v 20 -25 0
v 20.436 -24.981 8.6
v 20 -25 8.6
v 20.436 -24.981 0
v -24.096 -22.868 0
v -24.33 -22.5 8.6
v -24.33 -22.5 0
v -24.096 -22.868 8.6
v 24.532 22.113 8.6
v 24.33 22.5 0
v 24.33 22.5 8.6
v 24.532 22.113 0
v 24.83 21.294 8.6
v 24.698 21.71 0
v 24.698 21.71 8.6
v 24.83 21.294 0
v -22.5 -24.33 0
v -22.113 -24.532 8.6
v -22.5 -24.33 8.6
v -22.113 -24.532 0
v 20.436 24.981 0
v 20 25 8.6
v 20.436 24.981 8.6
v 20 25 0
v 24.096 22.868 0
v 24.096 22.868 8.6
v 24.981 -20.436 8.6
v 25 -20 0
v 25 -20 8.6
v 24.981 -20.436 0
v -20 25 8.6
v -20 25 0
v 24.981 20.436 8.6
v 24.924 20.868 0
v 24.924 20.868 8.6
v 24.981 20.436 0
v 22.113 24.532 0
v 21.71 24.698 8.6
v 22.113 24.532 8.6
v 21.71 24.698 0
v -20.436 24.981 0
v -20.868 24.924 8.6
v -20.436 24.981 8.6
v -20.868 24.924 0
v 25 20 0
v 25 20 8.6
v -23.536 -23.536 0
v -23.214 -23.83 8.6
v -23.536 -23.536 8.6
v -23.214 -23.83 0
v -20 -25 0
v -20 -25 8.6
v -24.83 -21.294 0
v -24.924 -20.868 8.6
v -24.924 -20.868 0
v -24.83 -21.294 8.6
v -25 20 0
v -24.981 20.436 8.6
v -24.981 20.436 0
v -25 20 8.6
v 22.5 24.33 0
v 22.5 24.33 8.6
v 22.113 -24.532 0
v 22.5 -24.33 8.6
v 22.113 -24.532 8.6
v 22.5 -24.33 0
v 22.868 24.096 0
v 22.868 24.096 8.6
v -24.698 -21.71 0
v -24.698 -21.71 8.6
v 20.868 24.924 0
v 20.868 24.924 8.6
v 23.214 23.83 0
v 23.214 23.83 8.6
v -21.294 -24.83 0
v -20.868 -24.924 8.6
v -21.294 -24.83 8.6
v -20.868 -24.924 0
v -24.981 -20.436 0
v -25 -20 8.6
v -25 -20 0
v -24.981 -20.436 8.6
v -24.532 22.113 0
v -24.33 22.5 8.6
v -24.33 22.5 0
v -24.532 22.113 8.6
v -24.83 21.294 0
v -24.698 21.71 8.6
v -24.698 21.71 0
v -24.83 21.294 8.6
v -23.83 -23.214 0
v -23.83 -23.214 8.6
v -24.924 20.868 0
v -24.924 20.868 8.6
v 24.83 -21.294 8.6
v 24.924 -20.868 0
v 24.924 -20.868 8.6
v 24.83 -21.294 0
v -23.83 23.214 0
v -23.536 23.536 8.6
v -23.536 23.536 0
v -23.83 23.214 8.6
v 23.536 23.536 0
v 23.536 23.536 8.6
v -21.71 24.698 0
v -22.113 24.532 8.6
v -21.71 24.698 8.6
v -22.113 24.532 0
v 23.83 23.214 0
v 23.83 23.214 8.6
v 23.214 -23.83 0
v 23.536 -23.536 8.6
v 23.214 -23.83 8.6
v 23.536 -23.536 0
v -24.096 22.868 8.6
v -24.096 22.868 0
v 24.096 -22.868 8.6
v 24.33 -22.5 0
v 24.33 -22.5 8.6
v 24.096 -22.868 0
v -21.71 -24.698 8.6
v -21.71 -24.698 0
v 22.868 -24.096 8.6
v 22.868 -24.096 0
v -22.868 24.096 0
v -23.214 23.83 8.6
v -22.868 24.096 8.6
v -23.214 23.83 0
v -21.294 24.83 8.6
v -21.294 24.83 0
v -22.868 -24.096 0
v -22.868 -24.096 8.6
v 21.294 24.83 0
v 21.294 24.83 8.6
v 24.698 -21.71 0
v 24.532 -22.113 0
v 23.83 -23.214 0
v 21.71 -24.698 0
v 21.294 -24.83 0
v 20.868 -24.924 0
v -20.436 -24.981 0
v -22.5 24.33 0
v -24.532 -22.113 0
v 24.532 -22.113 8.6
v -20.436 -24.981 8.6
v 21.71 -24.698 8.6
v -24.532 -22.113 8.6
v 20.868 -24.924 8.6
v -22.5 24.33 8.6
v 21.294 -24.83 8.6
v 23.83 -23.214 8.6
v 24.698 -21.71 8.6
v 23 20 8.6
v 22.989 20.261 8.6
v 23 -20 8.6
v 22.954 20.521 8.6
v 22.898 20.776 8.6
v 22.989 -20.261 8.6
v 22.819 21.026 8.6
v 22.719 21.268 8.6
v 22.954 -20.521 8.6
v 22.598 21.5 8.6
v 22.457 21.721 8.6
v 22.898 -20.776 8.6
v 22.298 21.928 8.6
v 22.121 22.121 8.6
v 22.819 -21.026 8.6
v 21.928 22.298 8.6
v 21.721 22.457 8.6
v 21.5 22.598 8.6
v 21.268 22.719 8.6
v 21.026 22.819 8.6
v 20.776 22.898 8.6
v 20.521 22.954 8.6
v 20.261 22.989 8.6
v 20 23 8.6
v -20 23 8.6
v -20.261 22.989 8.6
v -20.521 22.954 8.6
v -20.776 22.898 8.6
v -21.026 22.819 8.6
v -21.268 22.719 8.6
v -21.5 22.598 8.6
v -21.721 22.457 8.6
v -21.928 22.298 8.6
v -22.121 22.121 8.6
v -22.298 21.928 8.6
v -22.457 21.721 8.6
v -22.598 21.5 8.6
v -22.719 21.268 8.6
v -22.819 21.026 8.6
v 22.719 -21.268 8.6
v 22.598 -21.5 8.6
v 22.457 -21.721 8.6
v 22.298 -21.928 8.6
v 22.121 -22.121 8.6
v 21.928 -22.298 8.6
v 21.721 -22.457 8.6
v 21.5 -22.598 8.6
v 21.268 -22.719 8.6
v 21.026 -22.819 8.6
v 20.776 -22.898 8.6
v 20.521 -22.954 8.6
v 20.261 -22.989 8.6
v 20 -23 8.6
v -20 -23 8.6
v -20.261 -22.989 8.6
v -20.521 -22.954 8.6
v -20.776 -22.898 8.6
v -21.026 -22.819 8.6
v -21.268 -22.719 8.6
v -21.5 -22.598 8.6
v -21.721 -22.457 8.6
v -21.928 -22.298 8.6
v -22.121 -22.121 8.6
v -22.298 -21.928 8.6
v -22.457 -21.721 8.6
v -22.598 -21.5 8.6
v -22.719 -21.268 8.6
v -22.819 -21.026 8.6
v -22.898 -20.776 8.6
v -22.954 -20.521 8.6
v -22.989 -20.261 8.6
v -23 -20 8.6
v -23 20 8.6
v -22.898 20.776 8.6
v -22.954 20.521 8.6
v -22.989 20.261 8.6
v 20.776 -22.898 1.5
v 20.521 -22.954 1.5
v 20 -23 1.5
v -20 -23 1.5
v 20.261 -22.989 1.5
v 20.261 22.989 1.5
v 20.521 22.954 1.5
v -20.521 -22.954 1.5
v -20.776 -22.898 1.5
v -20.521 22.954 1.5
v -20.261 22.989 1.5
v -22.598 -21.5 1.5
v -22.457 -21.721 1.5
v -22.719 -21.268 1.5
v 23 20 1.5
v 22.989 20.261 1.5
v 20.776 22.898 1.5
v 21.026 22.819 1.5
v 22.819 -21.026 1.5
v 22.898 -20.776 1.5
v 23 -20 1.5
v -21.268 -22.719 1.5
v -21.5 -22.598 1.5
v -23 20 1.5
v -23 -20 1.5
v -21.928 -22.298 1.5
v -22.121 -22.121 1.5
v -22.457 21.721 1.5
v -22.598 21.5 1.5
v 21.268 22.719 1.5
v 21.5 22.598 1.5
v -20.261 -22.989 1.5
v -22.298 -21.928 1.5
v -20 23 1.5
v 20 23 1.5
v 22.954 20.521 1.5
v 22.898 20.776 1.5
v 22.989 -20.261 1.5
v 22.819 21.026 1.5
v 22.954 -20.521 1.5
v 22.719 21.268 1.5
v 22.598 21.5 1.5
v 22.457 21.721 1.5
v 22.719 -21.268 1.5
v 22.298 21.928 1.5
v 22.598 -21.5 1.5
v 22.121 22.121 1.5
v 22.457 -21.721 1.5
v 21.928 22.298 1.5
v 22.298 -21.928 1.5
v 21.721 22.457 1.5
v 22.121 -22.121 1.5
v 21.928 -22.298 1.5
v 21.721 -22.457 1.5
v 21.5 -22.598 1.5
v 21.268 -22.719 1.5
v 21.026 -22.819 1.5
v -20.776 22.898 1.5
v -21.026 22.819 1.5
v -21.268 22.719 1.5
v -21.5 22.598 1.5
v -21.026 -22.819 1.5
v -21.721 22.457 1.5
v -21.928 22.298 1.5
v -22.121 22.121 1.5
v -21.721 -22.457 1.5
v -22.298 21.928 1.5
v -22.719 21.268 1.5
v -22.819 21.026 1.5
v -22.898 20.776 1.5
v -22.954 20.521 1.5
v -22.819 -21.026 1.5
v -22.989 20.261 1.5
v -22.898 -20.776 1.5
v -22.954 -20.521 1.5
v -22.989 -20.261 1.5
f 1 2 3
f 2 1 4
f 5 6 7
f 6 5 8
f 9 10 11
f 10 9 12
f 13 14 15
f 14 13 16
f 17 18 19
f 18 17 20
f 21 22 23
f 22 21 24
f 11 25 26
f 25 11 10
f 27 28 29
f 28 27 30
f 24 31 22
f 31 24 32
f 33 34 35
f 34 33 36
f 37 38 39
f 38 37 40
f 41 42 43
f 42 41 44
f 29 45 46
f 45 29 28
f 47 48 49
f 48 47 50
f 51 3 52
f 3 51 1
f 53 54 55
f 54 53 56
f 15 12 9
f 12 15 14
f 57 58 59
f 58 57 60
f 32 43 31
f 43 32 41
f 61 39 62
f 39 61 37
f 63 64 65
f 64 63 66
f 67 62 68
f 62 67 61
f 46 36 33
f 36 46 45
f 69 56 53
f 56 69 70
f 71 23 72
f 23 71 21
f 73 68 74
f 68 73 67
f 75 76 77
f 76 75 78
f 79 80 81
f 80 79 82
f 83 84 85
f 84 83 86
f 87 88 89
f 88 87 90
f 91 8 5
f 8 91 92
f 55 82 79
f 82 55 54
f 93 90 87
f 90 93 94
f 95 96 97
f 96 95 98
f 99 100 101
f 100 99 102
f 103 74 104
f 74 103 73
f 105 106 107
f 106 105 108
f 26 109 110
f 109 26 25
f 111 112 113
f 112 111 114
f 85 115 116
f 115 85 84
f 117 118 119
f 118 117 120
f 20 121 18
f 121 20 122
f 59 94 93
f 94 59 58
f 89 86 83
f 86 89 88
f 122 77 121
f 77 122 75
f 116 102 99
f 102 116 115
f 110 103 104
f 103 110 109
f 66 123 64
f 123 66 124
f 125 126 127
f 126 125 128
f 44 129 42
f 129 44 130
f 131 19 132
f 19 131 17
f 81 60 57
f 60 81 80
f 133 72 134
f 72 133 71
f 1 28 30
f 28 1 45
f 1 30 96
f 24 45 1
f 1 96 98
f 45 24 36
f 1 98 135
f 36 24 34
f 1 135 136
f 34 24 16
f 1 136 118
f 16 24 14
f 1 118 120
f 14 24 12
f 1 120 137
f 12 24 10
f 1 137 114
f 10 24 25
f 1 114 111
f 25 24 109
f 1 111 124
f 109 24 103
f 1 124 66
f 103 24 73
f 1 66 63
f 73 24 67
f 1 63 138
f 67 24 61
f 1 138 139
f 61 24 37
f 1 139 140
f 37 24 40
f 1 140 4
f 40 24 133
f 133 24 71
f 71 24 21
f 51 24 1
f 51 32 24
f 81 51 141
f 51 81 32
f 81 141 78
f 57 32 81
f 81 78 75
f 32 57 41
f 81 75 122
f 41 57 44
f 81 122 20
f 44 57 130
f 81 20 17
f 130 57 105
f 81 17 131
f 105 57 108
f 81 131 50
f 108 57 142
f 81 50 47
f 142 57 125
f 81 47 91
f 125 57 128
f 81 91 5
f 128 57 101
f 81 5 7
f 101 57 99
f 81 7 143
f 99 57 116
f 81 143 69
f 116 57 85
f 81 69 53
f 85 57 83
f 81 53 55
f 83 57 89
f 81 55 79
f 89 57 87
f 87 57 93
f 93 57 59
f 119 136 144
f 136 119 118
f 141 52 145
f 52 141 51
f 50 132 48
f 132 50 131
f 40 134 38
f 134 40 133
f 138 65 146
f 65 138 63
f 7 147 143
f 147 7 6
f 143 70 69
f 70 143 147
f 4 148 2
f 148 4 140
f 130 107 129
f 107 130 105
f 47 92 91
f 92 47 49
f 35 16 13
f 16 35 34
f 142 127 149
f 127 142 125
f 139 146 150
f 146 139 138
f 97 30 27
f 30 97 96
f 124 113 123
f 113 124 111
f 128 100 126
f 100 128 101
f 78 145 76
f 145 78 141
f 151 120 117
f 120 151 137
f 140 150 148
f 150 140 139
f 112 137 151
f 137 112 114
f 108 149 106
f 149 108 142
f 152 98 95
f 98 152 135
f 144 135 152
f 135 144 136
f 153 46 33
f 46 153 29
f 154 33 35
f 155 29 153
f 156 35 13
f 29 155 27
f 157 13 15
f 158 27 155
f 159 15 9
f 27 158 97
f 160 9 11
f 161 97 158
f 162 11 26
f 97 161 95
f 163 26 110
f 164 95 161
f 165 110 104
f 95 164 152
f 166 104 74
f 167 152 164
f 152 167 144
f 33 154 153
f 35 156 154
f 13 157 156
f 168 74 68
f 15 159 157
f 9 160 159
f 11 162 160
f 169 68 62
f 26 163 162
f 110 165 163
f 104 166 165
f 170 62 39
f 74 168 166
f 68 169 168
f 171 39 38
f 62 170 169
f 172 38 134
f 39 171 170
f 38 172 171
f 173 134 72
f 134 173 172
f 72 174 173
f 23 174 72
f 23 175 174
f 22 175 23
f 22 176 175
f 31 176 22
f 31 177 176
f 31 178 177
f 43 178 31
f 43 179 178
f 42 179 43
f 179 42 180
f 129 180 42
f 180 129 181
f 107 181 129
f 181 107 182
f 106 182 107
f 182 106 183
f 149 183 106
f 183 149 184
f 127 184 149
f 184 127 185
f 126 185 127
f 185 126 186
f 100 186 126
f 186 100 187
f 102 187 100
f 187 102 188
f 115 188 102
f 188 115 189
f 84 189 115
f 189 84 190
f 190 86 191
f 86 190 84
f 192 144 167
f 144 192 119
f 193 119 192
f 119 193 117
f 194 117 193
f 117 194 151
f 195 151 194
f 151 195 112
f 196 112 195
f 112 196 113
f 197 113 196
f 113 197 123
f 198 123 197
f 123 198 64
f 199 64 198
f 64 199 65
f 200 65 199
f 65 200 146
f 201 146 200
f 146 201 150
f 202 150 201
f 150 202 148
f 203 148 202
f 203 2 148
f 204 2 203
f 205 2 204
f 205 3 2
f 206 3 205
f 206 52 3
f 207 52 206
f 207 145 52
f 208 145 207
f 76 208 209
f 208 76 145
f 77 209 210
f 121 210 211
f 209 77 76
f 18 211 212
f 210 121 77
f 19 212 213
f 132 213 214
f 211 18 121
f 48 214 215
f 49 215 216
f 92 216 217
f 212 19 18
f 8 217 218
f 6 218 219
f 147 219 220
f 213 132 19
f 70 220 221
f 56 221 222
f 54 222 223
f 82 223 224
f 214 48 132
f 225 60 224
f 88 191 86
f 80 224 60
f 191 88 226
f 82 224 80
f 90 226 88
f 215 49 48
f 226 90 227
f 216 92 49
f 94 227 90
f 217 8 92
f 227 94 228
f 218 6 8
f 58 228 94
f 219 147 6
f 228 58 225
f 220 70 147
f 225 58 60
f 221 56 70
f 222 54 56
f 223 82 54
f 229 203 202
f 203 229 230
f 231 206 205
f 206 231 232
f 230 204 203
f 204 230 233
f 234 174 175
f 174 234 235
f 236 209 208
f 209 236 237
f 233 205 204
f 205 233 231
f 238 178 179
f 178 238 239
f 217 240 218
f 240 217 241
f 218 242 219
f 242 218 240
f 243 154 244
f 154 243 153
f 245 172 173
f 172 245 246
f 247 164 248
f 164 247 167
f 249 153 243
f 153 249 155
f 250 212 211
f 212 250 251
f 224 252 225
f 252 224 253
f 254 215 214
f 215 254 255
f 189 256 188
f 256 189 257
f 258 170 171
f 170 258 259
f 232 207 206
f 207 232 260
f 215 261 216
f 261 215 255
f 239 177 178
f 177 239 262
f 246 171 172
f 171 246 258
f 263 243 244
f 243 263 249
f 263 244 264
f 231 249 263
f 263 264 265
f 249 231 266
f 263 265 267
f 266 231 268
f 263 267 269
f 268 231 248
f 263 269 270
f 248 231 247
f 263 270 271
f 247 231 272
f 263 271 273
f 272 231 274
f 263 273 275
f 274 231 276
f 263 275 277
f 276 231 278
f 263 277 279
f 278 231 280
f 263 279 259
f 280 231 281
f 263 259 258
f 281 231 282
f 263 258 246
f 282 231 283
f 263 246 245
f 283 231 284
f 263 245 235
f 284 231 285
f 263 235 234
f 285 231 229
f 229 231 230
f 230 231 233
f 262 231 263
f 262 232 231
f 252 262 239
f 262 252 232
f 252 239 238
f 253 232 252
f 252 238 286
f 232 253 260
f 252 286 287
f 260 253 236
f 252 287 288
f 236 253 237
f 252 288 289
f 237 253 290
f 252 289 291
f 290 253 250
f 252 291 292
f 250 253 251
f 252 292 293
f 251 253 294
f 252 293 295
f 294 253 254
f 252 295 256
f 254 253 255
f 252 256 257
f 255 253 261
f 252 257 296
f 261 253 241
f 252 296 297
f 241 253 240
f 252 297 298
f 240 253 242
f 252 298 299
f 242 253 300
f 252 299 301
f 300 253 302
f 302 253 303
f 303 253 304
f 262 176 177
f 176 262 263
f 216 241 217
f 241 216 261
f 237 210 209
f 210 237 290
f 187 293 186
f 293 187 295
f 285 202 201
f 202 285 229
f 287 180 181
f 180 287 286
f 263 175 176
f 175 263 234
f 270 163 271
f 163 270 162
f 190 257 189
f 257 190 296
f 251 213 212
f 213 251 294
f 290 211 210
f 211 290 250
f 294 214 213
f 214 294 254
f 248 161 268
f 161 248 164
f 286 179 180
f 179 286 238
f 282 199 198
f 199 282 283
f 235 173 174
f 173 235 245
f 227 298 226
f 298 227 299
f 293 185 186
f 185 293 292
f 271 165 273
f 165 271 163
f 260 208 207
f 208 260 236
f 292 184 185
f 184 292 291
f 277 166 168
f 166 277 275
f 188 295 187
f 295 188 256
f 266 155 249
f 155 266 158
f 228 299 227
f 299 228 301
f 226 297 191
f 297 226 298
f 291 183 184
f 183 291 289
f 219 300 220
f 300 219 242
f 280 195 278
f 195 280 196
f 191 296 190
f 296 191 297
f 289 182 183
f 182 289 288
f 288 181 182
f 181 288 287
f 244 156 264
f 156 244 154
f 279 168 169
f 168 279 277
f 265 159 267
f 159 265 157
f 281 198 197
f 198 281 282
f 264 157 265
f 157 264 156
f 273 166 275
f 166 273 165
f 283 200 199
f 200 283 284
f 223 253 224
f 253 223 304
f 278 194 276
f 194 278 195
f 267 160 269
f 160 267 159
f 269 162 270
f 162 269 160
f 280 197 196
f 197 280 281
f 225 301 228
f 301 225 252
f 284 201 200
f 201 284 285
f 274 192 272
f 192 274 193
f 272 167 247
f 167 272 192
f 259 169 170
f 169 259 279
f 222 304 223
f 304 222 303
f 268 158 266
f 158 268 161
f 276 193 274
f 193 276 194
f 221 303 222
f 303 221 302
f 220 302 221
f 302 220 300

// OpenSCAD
frame5050();

module frame5050() {
    
    wall_thickness=2;
    
    outside_side_length=50;
    outside_fillet_radius=5;
    outside_halfside_to_fillet = (outside_side_length/2)-outside_fillet_radius;
    outside_frame_pts = [
        for (a=[0:5:90])        [ outside_halfside_to_fillet+cos(a)*outside_fillet_radius,  outside_halfside_to_fillet+sin(a)*outside_fillet_radius],
        for (a=[-270:5:-180])   [-outside_halfside_to_fillet+cos(a)*outside_fillet_radius,  outside_halfside_to_fillet+sin(a)*outside_fillet_radius],
        for (a=[-180:5:-90])    [-outside_halfside_to_fillet+cos(a)*outside_fillet_radius, -outside_halfside_to_fillet+sin(a)*outside_fillet_radius],
        for (a=[-90:5:0])       [ outside_halfside_to_fillet+cos(a)*outside_fillet_radius, -outside_halfside_to_fillet+sin(a)*outside_fillet_radius],
    ];
    
    inside_fillet_radius=outside_fillet_radius-wall_thickness;
    inside_halfside_to_fillet = (outside_side_length/2)-inside_fillet_radius-wall_thickness;
    inside_frame1_pts = [
        for (a=[0:5:90])        [ inside_halfside_to_fillet+cos(a)*inside_fillet_radius,  inside_halfside_to_fillet+sin(a)*inside_fillet_radius],
        for (a=[-270:5:-180])   [-inside_halfside_to_fillet+cos(a)*inside_fillet_radius,  inside_halfside_to_fillet+sin(a)*inside_fillet_radius],
        for (a=[-180:5:-90])    [-inside_halfside_to_fillet+cos(a)*inside_fillet_radius, -inside_halfside_to_fillet+sin(a)*inside_fillet_radius],
        for (a=[-90:5:0])       [ inside_halfside_to_fillet+cos(a)*inside_fillet_radius, -inside_halfside_to_fillet+sin(a)*inside_fillet_radius],
    ]; 
    
    
    difference() {
        linear_extrude(8.6) polygon(outside_frame_pts);
        translate([0,0,1.5]) linear_extrude(8.6) polygon(inside_frame1_pts);
    }
}
